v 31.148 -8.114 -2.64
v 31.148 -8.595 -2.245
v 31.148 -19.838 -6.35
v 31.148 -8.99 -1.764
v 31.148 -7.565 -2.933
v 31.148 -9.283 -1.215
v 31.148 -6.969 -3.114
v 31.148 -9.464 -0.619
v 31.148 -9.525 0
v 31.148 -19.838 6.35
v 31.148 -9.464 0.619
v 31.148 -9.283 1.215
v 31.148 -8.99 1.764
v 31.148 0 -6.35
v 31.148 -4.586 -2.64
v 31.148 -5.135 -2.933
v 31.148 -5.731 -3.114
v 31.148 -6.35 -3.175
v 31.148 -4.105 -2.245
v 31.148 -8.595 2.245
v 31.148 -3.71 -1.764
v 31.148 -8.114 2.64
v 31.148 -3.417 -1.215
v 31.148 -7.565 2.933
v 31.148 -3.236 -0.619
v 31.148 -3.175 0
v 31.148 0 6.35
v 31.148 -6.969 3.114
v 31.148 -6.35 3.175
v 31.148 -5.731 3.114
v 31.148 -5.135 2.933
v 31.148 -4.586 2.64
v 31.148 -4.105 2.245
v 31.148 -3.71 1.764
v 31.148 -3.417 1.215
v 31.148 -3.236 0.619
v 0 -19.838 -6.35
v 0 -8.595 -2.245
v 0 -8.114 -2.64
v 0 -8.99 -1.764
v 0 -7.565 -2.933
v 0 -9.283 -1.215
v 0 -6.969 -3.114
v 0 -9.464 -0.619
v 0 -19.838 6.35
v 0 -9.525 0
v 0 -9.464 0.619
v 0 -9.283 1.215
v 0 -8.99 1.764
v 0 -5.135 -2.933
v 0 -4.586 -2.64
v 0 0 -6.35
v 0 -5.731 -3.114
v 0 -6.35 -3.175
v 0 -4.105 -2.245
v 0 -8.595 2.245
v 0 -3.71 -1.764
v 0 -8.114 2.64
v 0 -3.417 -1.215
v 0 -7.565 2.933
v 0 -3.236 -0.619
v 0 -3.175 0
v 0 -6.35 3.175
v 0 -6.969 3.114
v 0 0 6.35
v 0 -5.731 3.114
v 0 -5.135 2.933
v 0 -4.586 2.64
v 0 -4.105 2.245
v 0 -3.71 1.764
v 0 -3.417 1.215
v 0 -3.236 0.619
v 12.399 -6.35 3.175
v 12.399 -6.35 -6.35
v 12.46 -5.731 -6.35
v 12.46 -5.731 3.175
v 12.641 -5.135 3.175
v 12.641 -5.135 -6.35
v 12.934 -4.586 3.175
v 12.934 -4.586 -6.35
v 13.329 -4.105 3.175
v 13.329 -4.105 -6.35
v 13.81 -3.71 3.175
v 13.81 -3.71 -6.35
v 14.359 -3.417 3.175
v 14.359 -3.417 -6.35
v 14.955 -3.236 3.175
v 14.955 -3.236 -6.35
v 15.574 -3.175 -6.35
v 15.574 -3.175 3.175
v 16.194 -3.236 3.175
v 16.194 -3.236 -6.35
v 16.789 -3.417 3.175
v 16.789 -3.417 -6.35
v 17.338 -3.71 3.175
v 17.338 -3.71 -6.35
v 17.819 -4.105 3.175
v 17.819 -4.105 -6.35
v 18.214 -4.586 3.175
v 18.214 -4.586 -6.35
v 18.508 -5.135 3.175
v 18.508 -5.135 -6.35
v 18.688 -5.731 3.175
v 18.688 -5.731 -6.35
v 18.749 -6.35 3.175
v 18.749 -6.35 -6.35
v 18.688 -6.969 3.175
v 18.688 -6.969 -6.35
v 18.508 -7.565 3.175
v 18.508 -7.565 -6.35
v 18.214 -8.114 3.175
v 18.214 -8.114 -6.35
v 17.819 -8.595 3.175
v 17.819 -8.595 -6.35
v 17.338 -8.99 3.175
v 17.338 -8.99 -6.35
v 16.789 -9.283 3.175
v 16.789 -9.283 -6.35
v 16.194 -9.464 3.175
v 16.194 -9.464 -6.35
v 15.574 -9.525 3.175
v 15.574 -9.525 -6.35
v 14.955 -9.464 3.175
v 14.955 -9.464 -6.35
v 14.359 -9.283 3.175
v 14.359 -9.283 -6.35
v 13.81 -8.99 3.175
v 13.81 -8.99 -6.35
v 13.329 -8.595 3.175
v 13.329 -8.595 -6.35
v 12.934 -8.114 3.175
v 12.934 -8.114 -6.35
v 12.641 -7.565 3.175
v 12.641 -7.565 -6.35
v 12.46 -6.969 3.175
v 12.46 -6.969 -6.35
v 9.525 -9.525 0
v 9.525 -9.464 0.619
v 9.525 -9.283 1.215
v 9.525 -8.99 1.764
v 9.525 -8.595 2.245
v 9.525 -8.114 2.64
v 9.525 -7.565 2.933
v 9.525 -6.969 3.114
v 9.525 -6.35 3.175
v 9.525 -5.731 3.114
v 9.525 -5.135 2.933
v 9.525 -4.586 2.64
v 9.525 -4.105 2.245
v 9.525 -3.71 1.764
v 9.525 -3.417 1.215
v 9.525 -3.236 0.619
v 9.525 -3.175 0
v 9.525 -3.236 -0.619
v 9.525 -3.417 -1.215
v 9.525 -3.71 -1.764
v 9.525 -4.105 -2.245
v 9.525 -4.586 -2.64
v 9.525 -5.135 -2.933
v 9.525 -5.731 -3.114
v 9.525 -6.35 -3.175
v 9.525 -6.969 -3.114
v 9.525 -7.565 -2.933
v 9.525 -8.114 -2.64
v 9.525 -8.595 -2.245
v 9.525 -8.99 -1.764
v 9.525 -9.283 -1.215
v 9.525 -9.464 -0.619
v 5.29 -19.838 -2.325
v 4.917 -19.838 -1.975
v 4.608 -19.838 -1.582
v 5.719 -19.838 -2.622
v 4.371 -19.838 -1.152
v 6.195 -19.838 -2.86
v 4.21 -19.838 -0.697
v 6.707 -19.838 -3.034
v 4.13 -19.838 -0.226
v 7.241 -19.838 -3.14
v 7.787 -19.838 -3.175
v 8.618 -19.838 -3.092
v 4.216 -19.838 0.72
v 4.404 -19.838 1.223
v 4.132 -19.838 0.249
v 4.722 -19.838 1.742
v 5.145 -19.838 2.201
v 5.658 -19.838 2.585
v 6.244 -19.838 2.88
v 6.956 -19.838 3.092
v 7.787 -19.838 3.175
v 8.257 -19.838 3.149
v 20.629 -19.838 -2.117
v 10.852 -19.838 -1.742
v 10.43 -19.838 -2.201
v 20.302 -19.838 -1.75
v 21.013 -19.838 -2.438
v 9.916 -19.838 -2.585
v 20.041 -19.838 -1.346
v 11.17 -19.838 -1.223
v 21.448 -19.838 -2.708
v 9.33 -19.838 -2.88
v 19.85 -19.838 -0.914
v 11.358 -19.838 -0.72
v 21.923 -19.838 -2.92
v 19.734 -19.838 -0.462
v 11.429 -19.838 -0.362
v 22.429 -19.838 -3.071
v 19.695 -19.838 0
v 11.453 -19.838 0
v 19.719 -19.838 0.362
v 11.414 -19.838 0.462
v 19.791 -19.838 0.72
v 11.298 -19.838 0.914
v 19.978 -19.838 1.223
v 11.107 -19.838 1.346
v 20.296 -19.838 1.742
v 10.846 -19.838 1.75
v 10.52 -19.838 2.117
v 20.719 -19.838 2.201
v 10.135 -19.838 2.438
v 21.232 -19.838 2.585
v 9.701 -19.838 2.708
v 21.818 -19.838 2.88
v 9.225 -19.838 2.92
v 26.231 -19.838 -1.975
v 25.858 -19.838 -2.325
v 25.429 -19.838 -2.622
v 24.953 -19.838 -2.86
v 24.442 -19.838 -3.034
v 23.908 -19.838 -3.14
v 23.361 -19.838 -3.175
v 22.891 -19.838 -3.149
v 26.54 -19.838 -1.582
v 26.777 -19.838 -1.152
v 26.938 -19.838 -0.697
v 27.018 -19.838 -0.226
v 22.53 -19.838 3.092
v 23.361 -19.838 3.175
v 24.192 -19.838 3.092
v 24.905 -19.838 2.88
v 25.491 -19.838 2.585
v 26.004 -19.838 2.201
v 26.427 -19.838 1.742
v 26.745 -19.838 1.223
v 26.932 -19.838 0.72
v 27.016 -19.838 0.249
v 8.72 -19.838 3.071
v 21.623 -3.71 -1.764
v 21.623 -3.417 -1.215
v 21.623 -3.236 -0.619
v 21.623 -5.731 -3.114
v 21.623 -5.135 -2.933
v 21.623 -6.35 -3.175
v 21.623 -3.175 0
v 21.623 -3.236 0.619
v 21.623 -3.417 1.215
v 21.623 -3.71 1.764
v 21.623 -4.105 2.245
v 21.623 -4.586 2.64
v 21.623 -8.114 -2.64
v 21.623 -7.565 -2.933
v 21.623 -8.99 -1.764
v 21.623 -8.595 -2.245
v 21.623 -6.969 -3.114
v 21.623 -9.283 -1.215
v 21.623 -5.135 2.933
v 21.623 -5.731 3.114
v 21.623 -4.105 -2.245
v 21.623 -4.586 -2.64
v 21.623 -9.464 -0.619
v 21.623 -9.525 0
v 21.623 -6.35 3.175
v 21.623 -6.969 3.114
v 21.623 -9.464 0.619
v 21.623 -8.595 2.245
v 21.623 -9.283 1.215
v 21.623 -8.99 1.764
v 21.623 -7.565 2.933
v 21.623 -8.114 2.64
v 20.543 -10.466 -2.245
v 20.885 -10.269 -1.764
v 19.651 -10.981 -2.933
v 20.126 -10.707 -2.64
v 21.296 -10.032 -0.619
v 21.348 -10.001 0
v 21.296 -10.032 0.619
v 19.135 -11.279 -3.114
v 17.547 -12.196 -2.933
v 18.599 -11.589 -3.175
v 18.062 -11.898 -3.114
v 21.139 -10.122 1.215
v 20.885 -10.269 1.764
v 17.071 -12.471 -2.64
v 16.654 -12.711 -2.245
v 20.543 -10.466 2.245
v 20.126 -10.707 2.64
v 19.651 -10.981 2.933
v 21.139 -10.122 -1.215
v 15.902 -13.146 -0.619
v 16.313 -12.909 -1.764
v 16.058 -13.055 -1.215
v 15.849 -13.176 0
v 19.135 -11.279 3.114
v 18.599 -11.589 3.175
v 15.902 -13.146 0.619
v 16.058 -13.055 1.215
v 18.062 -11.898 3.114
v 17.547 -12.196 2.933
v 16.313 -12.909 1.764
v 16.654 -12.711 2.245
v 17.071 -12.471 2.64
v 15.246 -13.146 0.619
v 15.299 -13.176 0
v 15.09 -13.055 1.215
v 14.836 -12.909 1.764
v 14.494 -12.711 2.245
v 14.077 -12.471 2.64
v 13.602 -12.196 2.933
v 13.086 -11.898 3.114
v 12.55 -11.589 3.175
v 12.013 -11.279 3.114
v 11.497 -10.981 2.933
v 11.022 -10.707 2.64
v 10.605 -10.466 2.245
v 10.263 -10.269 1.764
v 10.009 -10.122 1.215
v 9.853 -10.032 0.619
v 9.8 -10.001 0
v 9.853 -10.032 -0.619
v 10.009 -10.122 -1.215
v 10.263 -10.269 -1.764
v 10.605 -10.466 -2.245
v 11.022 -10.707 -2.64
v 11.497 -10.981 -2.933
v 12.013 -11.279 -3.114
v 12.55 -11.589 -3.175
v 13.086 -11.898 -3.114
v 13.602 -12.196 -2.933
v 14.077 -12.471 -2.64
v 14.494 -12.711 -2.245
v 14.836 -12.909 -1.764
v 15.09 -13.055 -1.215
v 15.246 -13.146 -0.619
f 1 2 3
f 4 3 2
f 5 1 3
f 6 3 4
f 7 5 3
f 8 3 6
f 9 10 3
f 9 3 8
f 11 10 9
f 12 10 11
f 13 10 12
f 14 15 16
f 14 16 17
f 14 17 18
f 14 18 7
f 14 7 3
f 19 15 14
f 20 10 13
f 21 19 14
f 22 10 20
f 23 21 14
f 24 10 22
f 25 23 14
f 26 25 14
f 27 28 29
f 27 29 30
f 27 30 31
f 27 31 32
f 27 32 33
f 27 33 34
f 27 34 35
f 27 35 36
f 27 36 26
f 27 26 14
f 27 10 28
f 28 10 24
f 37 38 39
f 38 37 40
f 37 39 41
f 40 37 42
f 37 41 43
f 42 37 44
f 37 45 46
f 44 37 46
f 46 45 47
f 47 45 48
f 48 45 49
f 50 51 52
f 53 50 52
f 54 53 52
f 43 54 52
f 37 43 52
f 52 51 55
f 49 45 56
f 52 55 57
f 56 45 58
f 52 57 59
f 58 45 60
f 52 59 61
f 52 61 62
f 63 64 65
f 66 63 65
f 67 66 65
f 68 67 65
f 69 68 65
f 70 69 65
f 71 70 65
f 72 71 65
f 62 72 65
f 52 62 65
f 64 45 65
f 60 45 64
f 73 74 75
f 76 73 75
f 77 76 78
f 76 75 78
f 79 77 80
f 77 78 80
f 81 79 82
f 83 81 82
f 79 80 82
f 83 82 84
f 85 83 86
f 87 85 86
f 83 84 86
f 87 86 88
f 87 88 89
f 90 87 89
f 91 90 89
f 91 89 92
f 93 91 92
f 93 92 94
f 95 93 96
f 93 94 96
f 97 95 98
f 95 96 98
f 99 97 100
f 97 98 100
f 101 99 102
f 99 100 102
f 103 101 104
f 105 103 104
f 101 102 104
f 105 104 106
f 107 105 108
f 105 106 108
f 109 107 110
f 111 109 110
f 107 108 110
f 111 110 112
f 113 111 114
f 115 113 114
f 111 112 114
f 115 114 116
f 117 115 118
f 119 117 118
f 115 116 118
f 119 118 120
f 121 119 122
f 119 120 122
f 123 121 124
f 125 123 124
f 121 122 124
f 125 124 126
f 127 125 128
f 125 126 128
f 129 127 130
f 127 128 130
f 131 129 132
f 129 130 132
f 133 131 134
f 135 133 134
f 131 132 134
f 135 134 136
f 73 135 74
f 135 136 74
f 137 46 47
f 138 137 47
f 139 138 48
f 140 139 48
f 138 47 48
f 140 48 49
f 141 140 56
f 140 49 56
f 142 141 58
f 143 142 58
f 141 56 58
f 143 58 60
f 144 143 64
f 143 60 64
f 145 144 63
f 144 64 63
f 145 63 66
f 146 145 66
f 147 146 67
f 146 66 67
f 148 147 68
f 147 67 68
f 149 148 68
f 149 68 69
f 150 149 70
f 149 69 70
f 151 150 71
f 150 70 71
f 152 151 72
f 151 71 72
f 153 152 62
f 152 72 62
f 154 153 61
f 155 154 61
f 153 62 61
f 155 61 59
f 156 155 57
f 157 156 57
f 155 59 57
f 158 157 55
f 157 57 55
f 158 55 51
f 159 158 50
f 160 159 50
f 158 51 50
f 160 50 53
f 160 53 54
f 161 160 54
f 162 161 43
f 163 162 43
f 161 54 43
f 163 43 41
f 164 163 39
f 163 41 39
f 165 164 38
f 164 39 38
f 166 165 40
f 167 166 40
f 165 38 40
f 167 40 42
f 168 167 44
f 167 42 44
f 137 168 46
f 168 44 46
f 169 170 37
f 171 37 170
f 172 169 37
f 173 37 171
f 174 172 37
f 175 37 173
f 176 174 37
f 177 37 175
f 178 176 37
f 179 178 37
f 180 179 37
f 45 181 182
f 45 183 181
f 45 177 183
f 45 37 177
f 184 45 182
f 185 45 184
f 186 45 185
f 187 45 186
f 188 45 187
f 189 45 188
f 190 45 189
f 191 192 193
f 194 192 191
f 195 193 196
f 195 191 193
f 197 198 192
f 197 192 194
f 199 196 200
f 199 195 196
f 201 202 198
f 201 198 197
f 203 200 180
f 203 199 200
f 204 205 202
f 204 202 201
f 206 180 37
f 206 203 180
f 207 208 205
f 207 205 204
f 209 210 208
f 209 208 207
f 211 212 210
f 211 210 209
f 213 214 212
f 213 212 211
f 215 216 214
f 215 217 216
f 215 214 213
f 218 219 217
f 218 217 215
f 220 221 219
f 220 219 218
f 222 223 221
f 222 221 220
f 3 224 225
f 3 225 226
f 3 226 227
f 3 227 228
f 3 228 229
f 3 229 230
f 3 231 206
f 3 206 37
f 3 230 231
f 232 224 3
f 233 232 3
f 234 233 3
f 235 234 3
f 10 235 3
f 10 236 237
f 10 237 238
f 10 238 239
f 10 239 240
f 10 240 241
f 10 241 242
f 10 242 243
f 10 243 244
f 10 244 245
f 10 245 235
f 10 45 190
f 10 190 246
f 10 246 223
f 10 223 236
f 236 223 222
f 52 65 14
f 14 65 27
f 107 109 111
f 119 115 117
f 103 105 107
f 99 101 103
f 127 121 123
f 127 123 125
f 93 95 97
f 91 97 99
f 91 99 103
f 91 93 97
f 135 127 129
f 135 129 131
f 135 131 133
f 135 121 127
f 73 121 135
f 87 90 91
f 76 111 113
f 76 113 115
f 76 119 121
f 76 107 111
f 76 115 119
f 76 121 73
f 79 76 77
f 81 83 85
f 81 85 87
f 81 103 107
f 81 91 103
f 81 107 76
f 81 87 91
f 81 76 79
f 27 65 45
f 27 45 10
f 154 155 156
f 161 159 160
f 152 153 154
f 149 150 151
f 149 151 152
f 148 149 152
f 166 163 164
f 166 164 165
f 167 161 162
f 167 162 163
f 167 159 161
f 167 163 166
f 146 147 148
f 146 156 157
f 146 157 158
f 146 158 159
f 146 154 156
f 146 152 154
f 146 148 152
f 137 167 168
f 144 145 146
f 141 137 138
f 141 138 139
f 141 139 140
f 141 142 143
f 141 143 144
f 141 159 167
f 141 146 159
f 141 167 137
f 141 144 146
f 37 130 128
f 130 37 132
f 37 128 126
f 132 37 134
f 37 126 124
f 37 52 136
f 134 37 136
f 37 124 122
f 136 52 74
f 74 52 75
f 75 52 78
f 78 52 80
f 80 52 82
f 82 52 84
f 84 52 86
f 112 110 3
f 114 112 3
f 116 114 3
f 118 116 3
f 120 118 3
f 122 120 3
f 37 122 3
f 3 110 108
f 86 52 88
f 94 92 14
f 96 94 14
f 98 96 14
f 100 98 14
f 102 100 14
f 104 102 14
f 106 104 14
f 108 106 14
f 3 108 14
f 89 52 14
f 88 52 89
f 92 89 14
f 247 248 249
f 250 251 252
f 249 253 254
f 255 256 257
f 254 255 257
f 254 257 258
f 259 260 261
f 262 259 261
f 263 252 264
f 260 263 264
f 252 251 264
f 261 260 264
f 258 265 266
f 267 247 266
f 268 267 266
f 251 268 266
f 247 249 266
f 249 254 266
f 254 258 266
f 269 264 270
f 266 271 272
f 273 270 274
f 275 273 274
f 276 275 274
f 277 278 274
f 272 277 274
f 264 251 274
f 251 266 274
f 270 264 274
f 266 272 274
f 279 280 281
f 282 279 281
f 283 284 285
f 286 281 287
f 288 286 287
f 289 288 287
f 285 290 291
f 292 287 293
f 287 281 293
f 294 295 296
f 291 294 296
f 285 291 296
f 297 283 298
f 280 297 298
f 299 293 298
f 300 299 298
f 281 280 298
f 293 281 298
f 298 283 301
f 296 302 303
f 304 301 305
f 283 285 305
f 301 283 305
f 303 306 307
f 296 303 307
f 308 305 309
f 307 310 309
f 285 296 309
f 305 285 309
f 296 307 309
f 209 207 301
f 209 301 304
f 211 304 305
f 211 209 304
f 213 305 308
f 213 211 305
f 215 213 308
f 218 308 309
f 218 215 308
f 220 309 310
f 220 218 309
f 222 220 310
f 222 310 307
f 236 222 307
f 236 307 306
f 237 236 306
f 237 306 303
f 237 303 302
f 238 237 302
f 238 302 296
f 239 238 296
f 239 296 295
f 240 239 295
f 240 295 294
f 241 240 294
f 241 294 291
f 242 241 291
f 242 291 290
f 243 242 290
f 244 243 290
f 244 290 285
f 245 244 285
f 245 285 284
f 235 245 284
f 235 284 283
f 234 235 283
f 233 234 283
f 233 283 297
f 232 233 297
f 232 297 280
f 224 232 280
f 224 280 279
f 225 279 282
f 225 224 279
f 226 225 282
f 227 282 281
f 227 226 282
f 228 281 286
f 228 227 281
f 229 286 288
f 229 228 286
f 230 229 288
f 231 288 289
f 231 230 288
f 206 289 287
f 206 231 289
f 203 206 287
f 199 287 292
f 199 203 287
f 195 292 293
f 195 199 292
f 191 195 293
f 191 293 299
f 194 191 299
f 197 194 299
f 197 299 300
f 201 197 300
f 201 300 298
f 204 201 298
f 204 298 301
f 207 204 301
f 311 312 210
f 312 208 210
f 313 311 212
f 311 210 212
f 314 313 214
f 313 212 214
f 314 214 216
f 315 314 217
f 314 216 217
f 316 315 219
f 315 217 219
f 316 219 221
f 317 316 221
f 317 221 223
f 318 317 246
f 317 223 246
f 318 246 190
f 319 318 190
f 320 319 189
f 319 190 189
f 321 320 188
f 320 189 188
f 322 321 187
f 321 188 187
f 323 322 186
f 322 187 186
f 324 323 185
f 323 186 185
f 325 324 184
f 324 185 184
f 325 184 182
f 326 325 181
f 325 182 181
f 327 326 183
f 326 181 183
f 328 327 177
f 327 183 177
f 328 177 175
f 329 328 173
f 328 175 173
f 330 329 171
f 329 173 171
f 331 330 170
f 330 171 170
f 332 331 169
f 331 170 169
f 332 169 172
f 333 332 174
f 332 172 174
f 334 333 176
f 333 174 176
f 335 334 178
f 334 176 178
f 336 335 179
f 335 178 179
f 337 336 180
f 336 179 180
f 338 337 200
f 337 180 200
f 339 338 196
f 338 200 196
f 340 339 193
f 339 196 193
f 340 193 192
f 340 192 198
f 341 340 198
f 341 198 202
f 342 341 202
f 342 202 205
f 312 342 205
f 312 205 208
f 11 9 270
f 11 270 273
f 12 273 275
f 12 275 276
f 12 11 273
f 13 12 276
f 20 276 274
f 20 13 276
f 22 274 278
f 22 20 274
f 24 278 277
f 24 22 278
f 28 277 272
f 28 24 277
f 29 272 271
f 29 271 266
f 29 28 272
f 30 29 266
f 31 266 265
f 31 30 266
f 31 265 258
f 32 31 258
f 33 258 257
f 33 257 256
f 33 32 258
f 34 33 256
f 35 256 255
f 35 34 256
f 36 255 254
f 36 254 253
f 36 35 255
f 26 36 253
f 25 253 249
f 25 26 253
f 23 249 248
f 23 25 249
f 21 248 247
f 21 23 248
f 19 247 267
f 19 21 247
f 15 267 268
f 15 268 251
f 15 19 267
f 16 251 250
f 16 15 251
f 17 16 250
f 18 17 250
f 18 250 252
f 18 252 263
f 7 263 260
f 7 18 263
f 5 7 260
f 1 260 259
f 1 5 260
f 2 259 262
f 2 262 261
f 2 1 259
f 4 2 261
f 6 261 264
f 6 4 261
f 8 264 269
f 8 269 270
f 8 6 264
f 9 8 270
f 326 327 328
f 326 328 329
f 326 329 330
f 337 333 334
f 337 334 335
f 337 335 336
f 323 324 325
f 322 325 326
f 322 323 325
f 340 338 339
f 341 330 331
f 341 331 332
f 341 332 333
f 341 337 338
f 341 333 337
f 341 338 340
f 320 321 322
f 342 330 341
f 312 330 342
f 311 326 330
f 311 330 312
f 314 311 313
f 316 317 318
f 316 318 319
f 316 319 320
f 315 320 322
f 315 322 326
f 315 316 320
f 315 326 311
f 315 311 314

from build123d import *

# Parameters (mm, degrees)
SKETCH3_W                      = 31.148374891
SKETCH3_H                      = 19.837641971
BOSS_EXTRUDE1_DEPTH            = 6.35
SKETCH4_R                      = 3.175
CUT_EXTRUDE1_DEPTH             = 9.525
SKETCH5_R                      = 3.175
CUT_EXTRUDE5_DEPTH             = 9.525
CUT_EXTRUDE5_DIRECTION_2_REACH = 33.299
SKETCH6_R                      = 3.175
CUT_EXTRUDE6_DEPTH             = 9.525


with BuildPart() as part:
    # Sketch3 → Boss-Extrude1 (new, symmetric)
    with BuildSketch(Plane.XY):
        with Locations((15.574187446, -9.918820986)):
            Rectangle(SKETCH3_W, SKETCH3_H)
    extrude(amount=BOSS_EXTRUDE1_DEPTH, both=True)

    # Sketch4 → Cut-Extrude1 (cut)
    with BuildSketch(Plane.ZY):
        with Locations(Location((0, -6.35, 0), (0, 0, 270))):
            Circle(SKETCH4_R)
    cut_extrude1 = extrude(amount=-CUT_EXTRUDE1_DEPTH, mode=Mode.SUBTRACT)

    # Sketch5 → Cut-Extrude5 (cut)
    with BuildSketch(Plane(origin=(7.787093723, -19.837641971, 0), x_dir=(-0.8660254037844382, 0.500000000000001, 0), z_dir=(-0.500000000000001, -0.8660254037844382, 0))):
        with Locations(Location((0, 0, 0), (0, 0, 180))):
            Circle(SKETCH5_R)
    cut_extrude5 = extrude(amount=-CUT_EXTRUDE5_DEPTH, mode=Mode.SUBTRACT)

    # Sketch5 → Cut-Extrude5 direction 2 (cut, up to next)
    with BuildSketch(Plane(origin=(7.787093723, -19.837641971, 0), x_dir=(-0.8660254037844382, 0.500000000000001, 0), z_dir=(-0.500000000000001, -0.8660254037844382, 0)), mode=Mode.PRIVATE) as cut_extrude5_direction_2_sk1:
        with Locations(Location((0, 0, 0), (0, 0, 180))):
            Circle(SKETCH5_R)
    cut_extrude5_direction_2_tool1 = extrude(cut_extrude5_direction_2_sk1.sketch, amount=CUT_EXTRUDE5_DIRECTION_2_REACH, mode=Mode.PRIVATE) & part.part
    cut_extrude5_direction_2 = cut_extrude5_direction_2_tool1.solids().sort_by_distance((7.787094, -19.837642, 0))[0]
    add(cut_extrude5_direction_2, mode=Mode.SUBTRACT)

    # Sketch6 → Cut-Extrude6 (cut)
    with BuildSketch(Plane(origin=(0, 0, -6.35), x_dir=(-1, 0, 0), z_dir=(0, 0, -1))):
        with Locations((-15.574187445, -6.35)):
            Circle(SKETCH6_R)
    extrude(amount=-CUT_EXTRUDE6_DEPTH, mode=Mode.SUBTRACT)

    # Mirror1: Cut-Extrude1, Cut-Extrude5, Cut-Extrude5 direction 2 across plane
    add(cut_extrude1.mirror(Plane.ZY.offset(-15.574187445)), mode=Mode.SUBTRACT)
    add(cut_extrude5.mirror(Plane.ZY.offset(-15.574187445)), mode=Mode.SUBTRACT)
    add(cut_extrude5_direction_2.mirror(Plane.ZY.offset(-15.574187445)), mode=Mode.SUBTRACT)


solid = part.part
